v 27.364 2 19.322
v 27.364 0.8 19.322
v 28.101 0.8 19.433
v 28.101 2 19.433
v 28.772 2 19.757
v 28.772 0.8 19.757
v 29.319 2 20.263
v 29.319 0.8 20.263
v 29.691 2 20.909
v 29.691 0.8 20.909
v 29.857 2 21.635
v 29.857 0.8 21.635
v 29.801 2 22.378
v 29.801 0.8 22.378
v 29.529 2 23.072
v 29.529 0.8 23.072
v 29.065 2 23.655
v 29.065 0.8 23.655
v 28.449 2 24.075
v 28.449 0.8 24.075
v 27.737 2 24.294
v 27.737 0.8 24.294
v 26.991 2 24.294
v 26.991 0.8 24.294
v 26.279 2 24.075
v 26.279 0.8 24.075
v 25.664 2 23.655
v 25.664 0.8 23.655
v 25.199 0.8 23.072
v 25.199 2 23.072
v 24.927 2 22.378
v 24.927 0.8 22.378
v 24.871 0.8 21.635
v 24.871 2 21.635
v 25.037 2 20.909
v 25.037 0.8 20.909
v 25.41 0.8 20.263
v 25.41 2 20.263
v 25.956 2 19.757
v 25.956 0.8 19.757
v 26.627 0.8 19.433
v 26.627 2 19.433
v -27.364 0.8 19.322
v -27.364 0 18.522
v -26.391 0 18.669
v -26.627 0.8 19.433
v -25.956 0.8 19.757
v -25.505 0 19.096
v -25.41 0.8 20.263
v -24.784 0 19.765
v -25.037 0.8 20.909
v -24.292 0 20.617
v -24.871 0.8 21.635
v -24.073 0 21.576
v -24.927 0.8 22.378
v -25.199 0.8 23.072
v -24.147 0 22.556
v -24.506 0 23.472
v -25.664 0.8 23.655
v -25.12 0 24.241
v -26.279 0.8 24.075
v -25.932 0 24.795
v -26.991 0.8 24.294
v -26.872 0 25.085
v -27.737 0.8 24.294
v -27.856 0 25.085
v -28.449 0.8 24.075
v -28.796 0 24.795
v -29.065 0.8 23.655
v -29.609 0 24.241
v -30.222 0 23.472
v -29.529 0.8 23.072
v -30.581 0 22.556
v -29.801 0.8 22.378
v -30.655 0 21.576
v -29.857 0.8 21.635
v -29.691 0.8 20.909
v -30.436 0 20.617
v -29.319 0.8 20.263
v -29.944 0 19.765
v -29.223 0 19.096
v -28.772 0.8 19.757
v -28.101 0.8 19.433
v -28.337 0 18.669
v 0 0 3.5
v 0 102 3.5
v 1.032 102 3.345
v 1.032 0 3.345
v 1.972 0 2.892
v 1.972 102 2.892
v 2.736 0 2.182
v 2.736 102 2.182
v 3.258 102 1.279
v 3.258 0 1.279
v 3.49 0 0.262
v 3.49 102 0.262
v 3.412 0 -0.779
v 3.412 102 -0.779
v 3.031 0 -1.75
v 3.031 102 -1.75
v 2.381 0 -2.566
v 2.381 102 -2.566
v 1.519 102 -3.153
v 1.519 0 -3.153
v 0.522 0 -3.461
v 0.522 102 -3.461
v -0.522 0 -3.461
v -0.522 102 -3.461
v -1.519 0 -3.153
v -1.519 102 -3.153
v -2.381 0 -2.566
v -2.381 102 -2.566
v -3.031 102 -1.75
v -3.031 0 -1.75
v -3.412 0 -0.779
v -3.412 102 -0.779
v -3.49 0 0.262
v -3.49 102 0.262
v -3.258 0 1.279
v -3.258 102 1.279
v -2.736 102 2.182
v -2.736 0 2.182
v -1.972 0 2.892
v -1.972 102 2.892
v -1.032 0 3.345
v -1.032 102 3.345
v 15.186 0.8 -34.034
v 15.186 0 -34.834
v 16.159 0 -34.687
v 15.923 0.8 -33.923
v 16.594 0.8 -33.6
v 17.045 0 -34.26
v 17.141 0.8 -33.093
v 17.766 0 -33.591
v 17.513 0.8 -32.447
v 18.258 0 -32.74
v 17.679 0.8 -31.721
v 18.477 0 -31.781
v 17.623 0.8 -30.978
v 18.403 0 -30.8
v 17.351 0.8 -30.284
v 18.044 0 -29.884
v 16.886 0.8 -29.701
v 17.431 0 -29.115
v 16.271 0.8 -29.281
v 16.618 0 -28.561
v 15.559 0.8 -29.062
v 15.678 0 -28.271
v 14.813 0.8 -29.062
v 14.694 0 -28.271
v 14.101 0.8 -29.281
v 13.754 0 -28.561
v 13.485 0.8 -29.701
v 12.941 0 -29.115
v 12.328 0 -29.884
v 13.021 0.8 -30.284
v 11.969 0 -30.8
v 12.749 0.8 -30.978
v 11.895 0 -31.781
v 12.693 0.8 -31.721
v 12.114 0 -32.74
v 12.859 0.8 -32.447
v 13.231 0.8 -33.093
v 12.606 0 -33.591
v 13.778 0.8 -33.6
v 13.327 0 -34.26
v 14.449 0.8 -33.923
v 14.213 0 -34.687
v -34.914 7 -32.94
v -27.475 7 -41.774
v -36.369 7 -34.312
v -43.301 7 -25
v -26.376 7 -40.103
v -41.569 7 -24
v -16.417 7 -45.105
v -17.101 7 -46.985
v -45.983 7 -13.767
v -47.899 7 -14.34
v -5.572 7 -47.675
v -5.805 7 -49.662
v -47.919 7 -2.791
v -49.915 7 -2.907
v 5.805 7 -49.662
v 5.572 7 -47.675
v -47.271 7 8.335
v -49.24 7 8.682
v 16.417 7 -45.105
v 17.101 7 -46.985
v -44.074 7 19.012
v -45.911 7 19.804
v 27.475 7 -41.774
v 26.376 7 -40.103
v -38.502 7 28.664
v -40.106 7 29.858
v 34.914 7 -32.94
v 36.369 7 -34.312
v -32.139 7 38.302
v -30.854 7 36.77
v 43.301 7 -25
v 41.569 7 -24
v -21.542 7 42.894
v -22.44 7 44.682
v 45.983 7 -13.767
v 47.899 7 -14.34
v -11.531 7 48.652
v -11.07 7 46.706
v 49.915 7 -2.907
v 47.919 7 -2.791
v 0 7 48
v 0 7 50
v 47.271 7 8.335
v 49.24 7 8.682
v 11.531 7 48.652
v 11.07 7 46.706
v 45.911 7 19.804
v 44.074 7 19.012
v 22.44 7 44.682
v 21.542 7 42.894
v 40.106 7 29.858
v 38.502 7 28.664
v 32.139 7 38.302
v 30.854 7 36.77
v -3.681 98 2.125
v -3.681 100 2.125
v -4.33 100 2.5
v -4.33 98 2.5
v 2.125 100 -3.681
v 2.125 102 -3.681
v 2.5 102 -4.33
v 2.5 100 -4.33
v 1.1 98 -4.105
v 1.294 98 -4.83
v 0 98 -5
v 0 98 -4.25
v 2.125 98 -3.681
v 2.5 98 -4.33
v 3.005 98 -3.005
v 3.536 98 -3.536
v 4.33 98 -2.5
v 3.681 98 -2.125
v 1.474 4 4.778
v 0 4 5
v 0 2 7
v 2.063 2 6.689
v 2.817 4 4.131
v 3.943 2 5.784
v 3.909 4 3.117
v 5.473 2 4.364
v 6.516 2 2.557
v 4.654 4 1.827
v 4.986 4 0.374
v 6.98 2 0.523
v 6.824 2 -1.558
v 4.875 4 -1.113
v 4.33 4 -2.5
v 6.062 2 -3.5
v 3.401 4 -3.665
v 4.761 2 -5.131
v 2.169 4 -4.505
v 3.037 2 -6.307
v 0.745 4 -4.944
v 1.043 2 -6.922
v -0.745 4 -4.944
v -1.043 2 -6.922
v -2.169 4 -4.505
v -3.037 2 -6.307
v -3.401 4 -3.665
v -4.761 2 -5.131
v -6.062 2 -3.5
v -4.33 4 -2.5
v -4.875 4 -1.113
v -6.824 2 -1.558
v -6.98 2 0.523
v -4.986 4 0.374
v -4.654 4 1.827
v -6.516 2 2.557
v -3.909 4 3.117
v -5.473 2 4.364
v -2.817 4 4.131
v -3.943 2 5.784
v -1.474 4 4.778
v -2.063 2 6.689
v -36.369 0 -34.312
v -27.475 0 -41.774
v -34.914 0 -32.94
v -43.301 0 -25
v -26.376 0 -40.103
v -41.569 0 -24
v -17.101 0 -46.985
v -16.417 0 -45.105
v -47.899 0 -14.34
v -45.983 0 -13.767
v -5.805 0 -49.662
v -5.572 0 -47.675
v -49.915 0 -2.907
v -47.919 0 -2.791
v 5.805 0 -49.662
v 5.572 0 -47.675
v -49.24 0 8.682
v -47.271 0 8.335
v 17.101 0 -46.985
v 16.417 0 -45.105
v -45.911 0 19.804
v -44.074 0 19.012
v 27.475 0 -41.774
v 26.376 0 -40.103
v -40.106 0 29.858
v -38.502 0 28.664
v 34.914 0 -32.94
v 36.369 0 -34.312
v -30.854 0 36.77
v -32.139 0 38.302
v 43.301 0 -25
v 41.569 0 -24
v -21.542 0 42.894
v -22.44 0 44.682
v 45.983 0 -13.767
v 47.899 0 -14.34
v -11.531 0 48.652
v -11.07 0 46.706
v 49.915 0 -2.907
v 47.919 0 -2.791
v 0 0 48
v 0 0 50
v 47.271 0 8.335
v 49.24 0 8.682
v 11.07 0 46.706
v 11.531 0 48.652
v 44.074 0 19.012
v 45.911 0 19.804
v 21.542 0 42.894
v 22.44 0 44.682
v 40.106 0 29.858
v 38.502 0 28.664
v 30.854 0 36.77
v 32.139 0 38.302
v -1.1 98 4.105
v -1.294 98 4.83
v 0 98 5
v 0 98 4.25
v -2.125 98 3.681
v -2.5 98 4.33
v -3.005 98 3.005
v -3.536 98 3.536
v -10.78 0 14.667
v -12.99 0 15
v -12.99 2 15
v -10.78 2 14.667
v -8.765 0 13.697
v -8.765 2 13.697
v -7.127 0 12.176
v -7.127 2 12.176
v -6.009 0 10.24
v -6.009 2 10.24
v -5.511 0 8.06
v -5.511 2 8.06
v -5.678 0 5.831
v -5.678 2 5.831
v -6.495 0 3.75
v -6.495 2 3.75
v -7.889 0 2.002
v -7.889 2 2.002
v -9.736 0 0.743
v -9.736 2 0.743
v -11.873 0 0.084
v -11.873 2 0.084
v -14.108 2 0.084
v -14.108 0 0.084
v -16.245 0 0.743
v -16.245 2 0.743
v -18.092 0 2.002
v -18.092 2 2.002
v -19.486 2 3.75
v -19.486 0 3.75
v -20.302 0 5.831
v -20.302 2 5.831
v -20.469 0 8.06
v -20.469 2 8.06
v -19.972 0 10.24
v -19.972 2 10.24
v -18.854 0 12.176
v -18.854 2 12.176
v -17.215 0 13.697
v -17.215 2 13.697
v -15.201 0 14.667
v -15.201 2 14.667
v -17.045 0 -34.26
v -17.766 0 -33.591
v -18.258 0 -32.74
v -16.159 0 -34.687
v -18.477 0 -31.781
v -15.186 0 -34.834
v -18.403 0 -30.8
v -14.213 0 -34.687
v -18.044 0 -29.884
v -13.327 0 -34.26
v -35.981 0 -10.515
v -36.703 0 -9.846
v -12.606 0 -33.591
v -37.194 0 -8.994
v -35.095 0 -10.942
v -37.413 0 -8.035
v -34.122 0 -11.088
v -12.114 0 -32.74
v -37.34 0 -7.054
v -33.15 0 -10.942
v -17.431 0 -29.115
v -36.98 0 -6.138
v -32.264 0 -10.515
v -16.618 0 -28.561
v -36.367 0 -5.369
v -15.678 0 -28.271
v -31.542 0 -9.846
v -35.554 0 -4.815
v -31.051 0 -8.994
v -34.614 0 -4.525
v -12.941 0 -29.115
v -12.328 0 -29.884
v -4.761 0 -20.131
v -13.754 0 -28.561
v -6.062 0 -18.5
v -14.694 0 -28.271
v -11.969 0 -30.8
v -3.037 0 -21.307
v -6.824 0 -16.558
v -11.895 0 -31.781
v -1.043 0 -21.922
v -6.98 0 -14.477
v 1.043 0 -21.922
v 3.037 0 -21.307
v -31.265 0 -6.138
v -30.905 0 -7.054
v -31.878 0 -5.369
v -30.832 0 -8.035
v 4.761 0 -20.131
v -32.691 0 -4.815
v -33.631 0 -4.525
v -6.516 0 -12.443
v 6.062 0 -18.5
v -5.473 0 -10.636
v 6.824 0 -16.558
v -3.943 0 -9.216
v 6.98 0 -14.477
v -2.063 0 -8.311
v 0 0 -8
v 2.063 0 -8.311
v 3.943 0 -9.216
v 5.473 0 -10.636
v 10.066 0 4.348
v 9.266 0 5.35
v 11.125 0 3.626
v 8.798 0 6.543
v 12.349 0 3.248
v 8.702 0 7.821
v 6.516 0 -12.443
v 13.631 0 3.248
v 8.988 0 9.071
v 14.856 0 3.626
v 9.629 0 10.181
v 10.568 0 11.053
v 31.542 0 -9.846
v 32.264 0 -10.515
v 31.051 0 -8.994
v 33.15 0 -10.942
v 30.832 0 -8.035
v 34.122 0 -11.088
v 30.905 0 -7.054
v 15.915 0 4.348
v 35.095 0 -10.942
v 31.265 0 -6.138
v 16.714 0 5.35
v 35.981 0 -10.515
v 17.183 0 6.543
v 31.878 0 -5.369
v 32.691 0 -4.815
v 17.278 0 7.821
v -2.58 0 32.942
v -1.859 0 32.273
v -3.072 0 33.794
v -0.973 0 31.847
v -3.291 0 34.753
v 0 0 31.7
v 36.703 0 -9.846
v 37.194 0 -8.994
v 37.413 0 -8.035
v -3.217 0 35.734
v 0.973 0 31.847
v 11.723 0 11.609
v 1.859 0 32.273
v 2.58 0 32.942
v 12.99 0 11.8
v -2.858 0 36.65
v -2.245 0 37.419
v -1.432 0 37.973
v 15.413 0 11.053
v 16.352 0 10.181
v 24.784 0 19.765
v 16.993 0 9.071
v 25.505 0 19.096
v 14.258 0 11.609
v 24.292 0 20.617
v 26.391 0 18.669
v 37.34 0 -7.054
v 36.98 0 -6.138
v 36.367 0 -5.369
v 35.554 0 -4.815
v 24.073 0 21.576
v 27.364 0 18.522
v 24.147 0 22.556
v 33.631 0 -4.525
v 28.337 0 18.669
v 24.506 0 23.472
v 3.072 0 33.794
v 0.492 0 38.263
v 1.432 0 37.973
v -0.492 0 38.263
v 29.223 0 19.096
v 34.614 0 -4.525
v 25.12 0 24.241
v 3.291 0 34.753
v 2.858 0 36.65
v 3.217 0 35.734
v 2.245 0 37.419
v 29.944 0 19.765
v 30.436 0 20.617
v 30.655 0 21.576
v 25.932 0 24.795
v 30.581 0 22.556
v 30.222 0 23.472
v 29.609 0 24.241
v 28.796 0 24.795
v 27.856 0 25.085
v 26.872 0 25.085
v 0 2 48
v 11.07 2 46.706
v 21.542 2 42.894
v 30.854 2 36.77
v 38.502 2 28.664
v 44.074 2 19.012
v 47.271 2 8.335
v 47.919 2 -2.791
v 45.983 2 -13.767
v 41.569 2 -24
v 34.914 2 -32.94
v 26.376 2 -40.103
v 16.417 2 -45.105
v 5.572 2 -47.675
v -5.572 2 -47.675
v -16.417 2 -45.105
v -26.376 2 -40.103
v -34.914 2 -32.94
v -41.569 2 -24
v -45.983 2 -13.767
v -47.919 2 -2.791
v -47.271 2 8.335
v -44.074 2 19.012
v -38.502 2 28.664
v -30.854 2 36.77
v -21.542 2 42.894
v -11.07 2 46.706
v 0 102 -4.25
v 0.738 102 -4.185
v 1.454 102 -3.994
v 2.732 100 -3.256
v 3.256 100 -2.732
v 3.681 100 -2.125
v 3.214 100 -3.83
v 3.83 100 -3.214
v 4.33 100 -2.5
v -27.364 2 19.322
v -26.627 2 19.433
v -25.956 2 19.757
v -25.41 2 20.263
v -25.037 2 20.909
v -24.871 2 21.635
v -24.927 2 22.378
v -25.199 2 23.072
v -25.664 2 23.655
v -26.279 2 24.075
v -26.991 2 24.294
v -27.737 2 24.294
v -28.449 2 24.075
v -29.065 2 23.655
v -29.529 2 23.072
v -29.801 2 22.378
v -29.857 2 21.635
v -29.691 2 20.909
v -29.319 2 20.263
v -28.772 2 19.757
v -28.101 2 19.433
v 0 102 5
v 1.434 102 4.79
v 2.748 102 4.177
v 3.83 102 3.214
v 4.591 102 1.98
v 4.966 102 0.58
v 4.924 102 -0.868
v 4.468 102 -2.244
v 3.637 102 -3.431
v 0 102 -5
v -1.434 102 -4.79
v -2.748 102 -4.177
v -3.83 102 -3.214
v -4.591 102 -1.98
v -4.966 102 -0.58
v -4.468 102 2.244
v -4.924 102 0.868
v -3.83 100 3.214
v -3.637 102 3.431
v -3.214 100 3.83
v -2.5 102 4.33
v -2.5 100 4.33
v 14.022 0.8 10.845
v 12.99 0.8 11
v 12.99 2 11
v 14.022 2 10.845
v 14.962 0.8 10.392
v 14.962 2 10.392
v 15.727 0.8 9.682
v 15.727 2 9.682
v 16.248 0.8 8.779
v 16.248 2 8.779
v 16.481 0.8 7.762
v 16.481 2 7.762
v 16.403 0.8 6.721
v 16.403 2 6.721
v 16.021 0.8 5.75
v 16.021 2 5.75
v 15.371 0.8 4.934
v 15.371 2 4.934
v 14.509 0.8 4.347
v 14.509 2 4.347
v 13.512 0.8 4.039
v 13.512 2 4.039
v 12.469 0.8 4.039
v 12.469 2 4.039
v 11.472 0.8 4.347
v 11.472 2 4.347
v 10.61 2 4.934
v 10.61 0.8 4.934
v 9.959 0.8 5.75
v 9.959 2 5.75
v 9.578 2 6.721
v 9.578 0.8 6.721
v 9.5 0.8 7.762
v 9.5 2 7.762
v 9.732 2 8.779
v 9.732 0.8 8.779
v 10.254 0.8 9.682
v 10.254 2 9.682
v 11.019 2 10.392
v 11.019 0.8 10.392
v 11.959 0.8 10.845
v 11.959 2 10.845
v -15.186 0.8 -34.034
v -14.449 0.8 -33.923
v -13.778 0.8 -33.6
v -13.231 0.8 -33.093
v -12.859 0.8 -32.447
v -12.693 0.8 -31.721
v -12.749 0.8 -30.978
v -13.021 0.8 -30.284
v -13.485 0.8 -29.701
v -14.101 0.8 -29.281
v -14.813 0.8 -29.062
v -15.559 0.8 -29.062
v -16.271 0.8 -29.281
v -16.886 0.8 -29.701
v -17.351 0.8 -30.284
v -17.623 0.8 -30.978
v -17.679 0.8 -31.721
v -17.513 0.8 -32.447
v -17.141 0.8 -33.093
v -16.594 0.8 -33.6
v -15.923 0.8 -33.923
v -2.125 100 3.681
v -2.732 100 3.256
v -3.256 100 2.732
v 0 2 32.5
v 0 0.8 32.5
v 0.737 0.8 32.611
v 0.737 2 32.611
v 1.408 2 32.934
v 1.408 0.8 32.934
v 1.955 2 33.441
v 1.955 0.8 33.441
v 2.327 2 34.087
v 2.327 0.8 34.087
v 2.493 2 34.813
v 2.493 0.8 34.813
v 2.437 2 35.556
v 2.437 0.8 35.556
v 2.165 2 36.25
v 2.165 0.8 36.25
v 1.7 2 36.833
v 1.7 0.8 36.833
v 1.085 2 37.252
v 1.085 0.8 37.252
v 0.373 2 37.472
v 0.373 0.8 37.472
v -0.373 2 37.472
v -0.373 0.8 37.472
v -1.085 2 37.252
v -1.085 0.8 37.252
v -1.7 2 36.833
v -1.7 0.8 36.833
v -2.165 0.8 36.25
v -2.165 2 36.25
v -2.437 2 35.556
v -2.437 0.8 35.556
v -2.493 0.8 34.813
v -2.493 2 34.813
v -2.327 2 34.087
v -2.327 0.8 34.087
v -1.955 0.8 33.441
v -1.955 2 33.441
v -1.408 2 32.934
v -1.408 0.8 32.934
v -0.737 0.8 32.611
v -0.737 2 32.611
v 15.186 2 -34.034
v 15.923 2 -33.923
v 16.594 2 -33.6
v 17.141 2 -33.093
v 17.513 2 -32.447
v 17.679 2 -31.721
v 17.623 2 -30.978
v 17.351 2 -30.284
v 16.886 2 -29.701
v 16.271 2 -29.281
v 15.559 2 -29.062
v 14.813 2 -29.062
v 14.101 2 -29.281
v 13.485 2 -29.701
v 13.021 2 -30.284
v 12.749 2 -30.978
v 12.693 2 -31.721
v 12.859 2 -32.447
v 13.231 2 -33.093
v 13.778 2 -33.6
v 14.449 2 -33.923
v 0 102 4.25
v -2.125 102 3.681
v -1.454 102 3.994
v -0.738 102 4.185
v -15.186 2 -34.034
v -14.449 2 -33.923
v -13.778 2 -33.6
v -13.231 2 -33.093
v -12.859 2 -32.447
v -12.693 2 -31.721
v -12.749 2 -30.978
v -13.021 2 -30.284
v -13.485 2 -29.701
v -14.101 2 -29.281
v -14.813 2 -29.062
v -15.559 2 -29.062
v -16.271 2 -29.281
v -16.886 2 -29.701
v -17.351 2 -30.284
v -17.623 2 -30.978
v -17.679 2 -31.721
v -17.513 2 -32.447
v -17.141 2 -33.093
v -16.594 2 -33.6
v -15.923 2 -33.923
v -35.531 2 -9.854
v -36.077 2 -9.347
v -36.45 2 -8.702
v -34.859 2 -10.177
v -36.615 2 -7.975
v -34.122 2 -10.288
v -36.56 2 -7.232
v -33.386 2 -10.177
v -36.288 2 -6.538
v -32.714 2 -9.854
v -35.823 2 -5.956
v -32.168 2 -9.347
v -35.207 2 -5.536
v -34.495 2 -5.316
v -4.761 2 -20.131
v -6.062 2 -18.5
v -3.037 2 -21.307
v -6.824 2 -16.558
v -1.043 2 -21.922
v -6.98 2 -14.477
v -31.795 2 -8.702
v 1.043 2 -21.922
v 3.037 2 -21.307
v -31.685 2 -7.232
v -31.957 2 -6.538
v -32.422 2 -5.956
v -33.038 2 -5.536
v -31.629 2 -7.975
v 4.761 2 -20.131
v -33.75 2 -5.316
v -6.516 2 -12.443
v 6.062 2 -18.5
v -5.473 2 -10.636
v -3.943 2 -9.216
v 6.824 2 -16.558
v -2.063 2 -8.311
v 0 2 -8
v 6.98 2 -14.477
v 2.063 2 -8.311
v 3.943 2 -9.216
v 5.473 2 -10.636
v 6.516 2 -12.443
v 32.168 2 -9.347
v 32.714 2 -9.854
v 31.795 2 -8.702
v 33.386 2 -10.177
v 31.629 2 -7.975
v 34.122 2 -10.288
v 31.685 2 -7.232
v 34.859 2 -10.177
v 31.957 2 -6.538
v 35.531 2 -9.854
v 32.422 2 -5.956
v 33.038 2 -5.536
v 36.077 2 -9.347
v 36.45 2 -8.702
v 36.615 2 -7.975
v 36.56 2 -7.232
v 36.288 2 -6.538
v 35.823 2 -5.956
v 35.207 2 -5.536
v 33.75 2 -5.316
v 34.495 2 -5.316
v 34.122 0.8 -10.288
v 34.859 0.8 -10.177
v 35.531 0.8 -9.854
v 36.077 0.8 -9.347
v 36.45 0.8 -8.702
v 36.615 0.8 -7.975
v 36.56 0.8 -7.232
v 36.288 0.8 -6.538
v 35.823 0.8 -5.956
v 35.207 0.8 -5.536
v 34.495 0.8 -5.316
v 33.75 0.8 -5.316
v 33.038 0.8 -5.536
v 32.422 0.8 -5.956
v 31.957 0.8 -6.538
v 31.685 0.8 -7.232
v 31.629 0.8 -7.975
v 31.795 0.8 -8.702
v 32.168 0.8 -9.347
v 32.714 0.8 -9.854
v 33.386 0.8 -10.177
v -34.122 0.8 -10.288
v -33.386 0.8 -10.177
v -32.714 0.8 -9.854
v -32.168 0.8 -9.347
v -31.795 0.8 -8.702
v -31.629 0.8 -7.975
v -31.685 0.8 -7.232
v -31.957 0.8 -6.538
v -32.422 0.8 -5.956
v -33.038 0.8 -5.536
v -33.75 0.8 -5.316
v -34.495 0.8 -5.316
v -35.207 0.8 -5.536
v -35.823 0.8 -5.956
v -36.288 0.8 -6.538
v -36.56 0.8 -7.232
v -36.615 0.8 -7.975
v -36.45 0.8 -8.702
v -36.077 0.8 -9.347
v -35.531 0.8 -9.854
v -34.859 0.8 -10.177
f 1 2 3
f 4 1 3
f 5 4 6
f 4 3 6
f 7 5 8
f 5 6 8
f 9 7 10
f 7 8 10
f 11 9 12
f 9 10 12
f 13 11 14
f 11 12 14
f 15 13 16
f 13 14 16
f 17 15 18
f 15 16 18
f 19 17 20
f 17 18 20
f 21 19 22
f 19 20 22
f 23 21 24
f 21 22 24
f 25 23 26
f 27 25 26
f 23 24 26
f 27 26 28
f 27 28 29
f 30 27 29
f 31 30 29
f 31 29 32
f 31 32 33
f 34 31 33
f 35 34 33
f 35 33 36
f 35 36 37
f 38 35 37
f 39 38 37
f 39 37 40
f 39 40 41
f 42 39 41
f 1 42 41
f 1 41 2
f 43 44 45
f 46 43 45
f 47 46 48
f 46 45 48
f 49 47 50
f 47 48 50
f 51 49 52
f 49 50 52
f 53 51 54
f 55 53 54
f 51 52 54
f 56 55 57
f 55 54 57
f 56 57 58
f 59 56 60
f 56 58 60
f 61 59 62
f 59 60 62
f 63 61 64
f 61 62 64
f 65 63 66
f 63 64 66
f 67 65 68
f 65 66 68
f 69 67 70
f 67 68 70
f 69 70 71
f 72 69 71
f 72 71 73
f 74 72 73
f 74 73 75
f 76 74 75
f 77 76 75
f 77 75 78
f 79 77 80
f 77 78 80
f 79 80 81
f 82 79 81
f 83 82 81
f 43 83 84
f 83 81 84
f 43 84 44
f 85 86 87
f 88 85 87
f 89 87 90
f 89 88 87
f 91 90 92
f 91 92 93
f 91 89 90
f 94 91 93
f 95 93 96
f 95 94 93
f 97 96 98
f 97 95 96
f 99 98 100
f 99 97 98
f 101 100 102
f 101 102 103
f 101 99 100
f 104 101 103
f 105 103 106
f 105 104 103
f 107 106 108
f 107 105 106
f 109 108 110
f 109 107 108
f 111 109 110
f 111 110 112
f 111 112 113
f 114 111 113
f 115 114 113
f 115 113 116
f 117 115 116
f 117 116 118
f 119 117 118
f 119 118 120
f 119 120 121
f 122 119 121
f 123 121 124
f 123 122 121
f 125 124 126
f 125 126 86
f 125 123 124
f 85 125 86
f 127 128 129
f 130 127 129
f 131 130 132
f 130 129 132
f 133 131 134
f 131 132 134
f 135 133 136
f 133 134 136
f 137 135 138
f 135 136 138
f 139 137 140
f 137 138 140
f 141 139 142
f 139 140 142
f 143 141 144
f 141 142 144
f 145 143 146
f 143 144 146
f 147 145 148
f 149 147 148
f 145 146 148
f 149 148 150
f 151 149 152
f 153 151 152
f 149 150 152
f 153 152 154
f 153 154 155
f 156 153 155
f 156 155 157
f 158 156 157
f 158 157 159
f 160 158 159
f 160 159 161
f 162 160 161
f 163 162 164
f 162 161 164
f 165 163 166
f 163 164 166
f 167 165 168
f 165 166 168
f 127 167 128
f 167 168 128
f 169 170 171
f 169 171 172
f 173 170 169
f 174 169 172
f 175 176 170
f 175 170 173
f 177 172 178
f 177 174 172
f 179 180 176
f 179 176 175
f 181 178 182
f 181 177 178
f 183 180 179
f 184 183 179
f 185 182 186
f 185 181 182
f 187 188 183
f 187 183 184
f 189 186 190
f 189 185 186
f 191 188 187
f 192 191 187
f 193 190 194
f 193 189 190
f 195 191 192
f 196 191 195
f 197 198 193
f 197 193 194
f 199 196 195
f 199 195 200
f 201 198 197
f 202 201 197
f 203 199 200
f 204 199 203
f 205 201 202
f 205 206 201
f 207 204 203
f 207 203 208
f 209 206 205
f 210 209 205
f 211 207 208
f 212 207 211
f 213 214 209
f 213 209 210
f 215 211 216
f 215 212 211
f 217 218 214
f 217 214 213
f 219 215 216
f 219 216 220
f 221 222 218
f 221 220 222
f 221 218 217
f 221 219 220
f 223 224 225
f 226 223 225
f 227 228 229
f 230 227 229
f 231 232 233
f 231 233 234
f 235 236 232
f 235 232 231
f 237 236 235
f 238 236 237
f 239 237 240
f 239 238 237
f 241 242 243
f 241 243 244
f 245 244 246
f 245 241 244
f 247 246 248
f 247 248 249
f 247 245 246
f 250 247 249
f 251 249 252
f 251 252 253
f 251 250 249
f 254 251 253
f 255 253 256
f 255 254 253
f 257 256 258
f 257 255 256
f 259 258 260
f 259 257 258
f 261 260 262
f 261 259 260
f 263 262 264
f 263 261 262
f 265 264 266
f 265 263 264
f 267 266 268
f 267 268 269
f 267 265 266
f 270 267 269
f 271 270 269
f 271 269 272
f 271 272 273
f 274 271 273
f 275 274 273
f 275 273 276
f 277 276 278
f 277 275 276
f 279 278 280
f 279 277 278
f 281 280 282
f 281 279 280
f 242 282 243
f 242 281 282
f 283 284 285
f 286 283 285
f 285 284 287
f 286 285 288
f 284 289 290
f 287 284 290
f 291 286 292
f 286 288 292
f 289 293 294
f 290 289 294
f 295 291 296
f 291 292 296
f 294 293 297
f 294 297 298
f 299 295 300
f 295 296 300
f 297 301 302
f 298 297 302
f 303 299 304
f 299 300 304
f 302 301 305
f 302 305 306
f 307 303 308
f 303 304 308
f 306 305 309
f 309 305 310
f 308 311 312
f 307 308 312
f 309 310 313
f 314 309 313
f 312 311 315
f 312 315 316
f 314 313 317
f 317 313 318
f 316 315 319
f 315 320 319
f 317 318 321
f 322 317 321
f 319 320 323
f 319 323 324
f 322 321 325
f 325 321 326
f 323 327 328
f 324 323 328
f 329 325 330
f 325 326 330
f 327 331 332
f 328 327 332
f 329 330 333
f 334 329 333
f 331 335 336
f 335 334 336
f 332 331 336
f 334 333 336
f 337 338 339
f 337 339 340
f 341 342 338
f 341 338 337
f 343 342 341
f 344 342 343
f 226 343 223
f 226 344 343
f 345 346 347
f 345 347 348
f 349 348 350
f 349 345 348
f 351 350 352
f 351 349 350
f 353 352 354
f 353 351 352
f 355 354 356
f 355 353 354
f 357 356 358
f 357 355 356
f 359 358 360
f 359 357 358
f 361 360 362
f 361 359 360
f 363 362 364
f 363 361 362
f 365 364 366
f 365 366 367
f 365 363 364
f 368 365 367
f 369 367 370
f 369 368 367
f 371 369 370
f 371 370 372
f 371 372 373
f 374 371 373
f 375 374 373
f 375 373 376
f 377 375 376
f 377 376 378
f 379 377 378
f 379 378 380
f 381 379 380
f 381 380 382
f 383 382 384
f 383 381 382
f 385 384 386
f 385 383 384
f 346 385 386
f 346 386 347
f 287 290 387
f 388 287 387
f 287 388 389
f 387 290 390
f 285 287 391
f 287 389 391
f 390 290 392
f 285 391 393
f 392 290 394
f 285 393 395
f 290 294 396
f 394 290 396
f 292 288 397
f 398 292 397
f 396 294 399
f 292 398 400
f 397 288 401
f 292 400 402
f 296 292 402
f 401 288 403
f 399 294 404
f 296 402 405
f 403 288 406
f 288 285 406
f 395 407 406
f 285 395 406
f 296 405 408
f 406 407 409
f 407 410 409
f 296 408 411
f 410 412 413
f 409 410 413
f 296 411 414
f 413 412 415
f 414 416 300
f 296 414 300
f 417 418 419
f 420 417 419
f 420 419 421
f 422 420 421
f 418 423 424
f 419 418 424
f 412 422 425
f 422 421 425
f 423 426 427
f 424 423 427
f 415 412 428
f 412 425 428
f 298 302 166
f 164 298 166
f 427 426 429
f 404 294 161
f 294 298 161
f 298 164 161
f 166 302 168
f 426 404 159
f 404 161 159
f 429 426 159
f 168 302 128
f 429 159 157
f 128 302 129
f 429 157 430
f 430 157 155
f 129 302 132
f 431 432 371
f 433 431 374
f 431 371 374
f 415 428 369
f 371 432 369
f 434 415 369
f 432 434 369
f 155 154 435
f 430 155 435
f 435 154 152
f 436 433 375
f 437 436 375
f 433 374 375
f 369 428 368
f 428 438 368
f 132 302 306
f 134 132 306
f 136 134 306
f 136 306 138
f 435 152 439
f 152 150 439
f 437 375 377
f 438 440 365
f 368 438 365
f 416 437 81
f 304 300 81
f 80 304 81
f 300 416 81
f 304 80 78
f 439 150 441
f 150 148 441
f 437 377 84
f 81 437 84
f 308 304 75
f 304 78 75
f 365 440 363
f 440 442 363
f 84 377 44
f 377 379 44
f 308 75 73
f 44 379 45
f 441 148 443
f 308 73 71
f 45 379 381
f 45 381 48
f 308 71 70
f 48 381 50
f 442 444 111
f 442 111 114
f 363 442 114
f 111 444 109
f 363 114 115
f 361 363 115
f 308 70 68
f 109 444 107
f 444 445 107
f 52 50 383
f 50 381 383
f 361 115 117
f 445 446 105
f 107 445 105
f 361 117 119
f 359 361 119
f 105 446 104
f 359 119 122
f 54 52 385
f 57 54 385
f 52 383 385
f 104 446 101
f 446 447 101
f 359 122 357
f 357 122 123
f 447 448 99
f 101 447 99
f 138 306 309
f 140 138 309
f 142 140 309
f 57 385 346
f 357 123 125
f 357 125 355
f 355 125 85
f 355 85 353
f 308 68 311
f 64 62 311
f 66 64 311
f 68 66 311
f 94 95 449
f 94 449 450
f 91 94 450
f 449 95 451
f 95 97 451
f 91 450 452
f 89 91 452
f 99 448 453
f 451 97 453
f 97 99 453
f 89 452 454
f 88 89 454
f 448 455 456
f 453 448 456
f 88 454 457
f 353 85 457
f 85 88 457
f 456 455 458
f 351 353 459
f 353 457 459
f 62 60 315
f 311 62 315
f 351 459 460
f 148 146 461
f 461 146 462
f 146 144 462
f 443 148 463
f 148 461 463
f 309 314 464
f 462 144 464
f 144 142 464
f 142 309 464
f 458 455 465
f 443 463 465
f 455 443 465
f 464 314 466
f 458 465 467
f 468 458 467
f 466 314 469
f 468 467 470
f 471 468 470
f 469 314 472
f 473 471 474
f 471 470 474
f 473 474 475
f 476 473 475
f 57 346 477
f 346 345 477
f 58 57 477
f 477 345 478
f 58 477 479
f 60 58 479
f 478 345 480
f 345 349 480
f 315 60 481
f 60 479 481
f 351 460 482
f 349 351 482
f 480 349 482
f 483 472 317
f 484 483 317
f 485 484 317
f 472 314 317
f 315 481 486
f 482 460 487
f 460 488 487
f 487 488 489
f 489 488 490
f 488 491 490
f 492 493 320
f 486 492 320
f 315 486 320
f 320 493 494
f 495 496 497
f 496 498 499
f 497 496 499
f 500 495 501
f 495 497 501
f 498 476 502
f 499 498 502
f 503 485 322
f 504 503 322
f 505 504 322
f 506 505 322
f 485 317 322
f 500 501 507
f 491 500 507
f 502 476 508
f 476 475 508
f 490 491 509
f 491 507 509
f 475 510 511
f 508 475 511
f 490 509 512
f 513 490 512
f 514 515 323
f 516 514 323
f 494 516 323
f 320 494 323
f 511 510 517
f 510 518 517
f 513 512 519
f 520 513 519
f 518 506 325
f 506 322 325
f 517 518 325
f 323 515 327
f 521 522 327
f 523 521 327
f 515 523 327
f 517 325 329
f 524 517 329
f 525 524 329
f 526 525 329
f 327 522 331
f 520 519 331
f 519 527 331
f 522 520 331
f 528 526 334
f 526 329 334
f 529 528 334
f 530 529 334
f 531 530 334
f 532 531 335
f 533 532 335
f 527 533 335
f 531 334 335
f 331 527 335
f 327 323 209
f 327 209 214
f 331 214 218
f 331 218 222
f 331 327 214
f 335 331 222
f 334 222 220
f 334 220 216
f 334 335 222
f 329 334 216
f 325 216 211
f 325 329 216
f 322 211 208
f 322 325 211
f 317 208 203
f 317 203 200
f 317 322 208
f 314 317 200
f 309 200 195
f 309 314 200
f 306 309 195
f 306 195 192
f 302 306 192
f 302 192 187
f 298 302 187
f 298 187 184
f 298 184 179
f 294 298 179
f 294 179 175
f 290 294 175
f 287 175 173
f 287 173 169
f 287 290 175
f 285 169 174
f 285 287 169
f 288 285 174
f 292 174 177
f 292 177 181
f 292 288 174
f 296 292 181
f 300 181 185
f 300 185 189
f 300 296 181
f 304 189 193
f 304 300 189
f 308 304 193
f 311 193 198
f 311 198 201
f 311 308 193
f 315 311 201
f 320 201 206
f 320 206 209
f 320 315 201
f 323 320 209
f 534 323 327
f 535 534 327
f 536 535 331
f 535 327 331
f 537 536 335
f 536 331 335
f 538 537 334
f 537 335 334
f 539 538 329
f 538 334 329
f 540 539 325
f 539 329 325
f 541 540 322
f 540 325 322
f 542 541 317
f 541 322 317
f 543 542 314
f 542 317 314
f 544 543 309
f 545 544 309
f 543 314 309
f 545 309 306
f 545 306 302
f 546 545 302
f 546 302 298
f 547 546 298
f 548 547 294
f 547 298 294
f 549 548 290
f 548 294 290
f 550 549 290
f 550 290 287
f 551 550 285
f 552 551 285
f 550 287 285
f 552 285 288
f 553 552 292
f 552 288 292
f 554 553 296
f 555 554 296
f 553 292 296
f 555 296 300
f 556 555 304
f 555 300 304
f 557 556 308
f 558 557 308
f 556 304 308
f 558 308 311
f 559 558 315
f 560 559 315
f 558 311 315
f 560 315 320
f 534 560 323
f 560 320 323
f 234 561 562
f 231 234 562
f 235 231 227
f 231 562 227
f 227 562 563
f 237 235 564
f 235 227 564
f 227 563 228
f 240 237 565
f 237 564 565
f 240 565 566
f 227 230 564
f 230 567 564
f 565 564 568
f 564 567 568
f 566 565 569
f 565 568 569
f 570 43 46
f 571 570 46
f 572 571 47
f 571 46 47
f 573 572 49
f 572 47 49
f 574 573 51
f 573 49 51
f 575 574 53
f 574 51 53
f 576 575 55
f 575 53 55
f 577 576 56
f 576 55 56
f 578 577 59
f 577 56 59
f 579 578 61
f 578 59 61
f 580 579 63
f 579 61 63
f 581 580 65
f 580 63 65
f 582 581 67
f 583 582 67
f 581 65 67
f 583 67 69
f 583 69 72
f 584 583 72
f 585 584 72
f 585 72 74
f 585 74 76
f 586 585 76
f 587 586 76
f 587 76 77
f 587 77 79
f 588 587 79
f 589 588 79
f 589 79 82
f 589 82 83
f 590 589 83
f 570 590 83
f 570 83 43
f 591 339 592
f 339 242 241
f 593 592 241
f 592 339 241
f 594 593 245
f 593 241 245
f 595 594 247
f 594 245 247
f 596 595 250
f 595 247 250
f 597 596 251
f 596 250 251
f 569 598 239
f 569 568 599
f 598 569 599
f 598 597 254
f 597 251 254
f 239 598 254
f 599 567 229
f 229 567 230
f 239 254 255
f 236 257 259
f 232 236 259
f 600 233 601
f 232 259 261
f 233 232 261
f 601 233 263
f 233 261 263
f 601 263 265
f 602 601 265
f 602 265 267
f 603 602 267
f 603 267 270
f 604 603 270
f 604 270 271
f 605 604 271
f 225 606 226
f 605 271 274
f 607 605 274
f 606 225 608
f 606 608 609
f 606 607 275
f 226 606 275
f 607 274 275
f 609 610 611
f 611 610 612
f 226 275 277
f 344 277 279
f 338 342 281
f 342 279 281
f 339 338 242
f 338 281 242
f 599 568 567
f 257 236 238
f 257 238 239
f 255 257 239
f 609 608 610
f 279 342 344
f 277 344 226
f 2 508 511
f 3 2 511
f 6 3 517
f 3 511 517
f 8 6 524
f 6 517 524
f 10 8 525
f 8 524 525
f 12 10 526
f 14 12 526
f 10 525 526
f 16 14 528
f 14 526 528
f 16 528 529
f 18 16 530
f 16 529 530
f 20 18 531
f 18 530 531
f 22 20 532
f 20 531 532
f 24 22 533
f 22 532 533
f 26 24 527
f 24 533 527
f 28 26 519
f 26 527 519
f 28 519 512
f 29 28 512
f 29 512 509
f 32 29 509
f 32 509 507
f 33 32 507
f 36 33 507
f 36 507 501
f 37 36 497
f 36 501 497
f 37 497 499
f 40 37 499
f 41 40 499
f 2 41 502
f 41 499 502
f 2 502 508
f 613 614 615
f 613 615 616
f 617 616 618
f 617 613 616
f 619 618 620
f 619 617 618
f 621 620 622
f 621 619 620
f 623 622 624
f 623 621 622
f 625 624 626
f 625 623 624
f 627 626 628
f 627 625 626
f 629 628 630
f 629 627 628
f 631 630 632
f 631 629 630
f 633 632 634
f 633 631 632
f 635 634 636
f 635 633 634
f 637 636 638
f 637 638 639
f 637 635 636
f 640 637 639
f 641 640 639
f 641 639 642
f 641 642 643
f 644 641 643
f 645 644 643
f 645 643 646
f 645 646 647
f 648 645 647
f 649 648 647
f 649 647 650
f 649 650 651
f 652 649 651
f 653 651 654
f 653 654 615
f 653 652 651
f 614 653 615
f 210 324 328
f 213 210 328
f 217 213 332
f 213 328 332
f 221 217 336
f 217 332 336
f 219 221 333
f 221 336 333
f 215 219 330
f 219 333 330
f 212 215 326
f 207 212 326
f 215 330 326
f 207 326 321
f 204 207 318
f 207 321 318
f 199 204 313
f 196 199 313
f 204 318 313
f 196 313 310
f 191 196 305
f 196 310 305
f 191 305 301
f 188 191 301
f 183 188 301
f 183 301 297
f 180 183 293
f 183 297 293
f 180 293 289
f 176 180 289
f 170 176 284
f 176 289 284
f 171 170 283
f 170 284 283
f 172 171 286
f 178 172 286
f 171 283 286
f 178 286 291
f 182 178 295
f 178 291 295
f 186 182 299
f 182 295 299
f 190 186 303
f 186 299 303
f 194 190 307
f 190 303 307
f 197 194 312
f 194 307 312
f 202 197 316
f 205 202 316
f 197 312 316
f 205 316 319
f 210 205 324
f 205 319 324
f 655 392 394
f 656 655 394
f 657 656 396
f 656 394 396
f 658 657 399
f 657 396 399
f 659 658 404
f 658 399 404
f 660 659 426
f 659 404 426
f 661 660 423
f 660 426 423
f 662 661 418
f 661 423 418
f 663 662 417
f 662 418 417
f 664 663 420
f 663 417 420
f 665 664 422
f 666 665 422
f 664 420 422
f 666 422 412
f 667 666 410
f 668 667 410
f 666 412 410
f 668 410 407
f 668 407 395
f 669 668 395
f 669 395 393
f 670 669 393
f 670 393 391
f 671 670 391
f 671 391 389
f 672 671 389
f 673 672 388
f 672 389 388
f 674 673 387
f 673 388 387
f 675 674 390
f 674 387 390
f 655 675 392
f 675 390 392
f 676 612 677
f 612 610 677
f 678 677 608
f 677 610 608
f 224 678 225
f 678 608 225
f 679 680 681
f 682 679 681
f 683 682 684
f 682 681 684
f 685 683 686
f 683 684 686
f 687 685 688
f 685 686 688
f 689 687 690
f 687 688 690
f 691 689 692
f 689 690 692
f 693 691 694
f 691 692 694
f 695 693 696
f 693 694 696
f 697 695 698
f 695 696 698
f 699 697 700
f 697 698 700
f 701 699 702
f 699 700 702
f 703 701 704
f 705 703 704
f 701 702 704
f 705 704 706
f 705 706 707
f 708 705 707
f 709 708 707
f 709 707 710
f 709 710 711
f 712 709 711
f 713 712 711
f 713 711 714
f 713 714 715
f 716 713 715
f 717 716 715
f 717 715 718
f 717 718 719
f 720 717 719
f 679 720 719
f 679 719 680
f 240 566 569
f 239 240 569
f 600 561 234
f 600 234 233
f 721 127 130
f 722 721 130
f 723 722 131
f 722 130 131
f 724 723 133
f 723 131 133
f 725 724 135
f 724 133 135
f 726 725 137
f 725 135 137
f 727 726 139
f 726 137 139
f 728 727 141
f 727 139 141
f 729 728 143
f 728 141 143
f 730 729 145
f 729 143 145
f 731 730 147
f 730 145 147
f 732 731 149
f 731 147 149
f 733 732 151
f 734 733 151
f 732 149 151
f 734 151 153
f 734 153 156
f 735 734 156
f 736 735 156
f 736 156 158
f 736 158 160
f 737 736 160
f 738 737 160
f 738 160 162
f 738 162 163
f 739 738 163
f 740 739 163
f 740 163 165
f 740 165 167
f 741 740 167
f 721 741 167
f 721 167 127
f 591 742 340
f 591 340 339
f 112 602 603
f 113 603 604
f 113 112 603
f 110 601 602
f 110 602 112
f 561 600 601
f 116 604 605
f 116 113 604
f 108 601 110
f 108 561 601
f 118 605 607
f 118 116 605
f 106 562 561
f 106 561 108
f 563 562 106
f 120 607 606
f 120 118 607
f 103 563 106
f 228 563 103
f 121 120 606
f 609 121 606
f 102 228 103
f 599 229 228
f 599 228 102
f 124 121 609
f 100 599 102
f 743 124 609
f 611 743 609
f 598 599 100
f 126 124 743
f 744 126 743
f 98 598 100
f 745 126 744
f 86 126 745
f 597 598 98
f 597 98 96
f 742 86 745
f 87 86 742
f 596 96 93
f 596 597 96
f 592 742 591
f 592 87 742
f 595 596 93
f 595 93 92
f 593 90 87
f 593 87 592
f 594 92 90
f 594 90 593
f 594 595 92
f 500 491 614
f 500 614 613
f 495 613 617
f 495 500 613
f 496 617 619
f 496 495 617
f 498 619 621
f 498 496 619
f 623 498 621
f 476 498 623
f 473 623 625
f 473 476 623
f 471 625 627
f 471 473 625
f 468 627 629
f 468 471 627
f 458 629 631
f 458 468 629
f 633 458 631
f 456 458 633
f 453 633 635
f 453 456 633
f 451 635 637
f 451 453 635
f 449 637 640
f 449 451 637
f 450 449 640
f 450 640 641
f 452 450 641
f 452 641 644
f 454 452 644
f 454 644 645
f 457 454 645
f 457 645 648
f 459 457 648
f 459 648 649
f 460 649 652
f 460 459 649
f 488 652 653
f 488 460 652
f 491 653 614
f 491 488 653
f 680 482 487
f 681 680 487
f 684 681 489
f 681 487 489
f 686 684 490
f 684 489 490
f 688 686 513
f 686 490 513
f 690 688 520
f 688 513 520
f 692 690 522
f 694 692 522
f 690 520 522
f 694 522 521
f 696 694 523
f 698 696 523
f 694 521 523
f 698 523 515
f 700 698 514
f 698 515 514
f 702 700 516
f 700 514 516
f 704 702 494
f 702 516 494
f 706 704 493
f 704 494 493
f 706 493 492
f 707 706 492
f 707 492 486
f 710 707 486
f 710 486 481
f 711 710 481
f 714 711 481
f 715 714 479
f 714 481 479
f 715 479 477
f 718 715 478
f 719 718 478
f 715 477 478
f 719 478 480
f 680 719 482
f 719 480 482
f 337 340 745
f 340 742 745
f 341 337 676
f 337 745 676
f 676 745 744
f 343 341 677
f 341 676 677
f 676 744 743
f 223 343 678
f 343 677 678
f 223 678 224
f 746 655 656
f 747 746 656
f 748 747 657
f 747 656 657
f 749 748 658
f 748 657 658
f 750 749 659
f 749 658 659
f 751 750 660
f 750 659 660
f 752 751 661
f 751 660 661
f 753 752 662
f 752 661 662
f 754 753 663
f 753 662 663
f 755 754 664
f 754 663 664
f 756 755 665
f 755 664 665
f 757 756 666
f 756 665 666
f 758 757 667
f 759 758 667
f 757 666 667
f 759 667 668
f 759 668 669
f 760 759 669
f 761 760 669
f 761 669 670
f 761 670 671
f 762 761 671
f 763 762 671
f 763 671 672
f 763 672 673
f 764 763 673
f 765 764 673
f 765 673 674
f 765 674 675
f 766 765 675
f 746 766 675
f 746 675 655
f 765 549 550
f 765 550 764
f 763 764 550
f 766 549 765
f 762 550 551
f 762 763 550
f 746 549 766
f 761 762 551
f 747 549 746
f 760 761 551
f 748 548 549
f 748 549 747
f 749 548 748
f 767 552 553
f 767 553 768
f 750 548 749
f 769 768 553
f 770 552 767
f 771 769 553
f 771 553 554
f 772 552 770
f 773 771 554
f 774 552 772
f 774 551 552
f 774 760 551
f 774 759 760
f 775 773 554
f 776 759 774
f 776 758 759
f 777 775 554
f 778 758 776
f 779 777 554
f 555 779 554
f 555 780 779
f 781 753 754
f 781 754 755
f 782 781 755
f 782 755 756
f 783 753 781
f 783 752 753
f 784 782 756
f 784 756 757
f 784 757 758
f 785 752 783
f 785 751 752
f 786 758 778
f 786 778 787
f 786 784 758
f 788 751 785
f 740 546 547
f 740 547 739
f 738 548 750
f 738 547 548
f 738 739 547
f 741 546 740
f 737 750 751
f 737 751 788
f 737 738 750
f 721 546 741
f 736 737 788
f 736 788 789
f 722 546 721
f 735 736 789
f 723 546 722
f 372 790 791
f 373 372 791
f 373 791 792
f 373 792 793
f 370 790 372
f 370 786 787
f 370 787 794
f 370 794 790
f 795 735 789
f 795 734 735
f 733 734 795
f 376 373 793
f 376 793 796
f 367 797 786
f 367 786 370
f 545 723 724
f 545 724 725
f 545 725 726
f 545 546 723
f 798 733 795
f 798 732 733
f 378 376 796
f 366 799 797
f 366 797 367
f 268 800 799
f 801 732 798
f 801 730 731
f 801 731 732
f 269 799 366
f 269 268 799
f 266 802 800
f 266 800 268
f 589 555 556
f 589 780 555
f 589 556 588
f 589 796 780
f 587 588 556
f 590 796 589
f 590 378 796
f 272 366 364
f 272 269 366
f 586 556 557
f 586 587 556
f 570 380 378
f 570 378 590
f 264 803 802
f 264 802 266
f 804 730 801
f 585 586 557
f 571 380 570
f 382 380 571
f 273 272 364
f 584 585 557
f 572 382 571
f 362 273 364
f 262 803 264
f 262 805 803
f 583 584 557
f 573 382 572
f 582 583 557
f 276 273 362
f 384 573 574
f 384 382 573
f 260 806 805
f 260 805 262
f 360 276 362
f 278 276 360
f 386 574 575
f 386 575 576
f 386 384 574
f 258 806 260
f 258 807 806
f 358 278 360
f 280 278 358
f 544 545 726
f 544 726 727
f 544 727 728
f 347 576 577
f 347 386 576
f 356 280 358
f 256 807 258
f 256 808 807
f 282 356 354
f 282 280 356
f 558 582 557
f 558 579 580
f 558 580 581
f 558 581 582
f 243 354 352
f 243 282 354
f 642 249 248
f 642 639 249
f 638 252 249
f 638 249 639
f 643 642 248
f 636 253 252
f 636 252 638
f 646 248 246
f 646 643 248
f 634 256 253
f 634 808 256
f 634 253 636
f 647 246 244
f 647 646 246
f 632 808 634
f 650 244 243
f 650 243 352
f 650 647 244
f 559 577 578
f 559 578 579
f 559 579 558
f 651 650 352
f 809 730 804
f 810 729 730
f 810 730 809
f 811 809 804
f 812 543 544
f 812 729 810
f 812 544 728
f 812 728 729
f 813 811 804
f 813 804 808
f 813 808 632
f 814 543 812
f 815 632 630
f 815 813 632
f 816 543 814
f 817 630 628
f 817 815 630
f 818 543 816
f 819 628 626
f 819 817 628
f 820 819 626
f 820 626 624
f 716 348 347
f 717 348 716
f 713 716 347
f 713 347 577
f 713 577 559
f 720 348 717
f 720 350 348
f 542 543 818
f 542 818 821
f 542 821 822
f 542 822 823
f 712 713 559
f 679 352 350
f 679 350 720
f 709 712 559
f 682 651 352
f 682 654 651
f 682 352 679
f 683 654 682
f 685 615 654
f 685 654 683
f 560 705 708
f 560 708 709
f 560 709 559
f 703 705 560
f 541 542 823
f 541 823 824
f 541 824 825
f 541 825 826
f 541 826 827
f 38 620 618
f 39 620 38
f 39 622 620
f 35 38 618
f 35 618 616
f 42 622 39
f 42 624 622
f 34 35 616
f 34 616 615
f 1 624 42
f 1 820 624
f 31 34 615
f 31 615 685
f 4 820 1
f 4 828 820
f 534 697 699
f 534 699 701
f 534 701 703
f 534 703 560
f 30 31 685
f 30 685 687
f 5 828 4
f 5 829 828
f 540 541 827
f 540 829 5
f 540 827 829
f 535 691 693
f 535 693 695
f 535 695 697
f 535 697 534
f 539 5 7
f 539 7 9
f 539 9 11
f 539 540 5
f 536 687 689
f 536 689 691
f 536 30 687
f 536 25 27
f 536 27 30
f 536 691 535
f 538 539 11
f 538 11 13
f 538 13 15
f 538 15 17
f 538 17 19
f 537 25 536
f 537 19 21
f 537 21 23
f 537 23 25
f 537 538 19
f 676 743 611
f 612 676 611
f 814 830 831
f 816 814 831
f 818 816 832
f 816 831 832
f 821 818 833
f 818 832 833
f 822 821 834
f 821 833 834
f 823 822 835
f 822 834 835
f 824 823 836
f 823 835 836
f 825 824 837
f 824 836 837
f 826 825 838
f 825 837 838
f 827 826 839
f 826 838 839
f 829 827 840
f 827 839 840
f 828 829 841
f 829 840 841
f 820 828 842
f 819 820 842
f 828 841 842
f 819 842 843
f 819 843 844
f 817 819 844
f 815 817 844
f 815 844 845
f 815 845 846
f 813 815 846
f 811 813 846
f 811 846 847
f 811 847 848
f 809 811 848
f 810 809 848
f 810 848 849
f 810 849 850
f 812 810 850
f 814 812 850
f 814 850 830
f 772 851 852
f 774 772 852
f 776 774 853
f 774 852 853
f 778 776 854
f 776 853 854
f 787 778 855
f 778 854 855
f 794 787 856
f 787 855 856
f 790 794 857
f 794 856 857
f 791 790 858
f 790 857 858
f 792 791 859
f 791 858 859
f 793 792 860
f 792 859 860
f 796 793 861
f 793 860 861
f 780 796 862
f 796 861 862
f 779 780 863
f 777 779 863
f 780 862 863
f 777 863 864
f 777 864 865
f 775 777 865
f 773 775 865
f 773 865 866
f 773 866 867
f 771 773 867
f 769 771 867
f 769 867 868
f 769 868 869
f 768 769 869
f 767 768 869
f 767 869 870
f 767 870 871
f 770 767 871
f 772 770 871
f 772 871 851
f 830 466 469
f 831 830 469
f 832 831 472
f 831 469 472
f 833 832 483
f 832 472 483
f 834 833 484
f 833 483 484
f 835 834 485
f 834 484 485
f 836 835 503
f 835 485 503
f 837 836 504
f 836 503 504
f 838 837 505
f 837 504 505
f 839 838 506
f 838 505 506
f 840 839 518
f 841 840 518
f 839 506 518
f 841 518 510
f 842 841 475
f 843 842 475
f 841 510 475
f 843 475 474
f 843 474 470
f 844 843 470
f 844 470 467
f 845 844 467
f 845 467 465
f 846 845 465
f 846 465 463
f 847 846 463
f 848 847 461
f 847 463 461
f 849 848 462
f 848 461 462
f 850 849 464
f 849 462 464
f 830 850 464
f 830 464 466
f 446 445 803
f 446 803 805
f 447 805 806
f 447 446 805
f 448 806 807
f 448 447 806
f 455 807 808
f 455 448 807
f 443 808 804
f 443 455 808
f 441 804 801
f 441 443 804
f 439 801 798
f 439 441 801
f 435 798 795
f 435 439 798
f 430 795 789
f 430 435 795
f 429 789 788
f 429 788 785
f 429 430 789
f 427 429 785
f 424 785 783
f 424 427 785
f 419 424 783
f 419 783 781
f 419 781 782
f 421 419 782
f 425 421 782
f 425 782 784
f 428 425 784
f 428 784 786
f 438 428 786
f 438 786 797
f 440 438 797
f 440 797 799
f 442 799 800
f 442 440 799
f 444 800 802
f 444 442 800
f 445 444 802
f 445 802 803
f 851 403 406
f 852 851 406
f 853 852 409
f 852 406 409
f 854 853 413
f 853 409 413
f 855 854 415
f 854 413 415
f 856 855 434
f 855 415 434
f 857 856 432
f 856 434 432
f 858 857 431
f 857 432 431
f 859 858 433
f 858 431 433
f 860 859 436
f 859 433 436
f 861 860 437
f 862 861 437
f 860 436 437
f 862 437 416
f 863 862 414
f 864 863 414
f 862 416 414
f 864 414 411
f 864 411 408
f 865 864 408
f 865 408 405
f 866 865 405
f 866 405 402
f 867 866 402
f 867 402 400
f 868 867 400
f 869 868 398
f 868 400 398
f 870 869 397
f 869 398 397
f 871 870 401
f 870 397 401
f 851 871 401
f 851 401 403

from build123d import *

# Parameters (mm, degrees)
SKETCH1_R                = 48
SKETCH1_R_2              = 7
SKETCH1_R_3              = 7.5
SKETCH1_R_4              = 3.5
BOSS_EXTRUDE1_DEPTH      = 2
SKETCH3_R                = 5
SKETCH3_R_2              = 3.5
BOSS_EXTRUDE2_DEPTH      = 100
CUT_EXTRUDE2_REACH       = 124.523
SKETCH6_R                = 2.5
CHAMFER2_SIZE            = 0.8
SKETCH7_W                = 0.75
SKETCH7_H                = 2
CUT_REVOLVE1_ANGLE       = 30
SKETCH7_4_W              = 0.75
SKETCH7_4_H              = 2
CUT_REVOLVE2_ANGLE       = 60
CIRPATTERN5_COUNT        = 2
BOSS_EXTRUDE3_DEPTH      = 5
BOSS_EXTRUDE3_DEPTH_BACK = 2
SKETCH8_R                = 50
SKETCH8_R_2              = 48
CHAMFER3_SIZE            = 2


with BuildPart() as part:
    # Sketch1 → Boss-Extrude1 (new body)
    with BuildSketch(Plane(origin=(0, 0, 0), x_dir=(1, 0, 0), z_dir=(0, 1, 0))):
        Circle(SKETCH1_R)
        with Locations((0, 15)):
            Circle(SKETCH1_R_2, mode=Mode.SUBTRACT)
        with Locations((-12.990381057, -7.5)):
            Circle(SKETCH1_R_3, mode=Mode.SUBTRACT)
        with Locations((12.990381057, -7.5)):
            Circle(SKETCH1_R_4, mode=Mode.SUBTRACT)
        Circle(SKETCH1_R_4, mode=Mode.SUBTRACT)
    extrude(amount=BOSS_EXTRUDE1_DEPTH)

    # Sketch3 → Boss-Extrude2 (add)
    with BuildSketch(Plane(origin=(0, 2, 0), x_dir=(1, 0, 0), z_dir=(0, 1, 0))):
        Circle(SKETCH3_R)
        Circle(SKETCH3_R_2, mode=Mode.SUBTRACT)
    extrude(amount=BOSS_EXTRUDE2_DEPTH)

    # Sketch6 → Cut-Extrude2 (cut, up to next)
    with BuildSketch(Plane.XZ, mode=Mode.PRIVATE) as cut_extrude2_sk1:
        with Locations((27.364101886, 21.822143065)):
            Circle(SKETCH6_R)
    cut_extrude2_tool1 = extrude(cut_extrude2_sk1.sketch, amount=-CUT_EXTRUDE2_REACH, mode=Mode.PRIVATE) & part.part
    # Sketch6 → Cut-Extrude2 (cut, up to next)
    with BuildSketch(Plane.XZ, mode=Mode.PRIVATE) as cut_extrude2_sk2:
        with Locations((34.122476926, -7.788232688)):
            Circle(SKETCH6_R)
    cut_extrude2_tool2 = extrude(cut_extrude2_sk2.sketch, amount=-CUT_EXTRUDE2_REACH, mode=Mode.PRIVATE) & part.part
    # Sketch6 → Cut-Extrude2 (cut, up to next)
    with BuildSketch(Plane.XZ, mode=Mode.PRIVATE) as cut_extrude2_sk3:
        with Locations((0, 35)):
            Circle(SKETCH6_R)
    cut_extrude2_tool3 = extrude(cut_extrude2_sk3.sketch, amount=-CUT_EXTRUDE2_REACH, mode=Mode.PRIVATE) & part.part
    # Sketch6 → Cut-Extrude2 (cut, up to next)
    with BuildSketch(Plane.XZ, mode=Mode.PRIVATE) as cut_extrude2_sk4:
        with Locations((15.185930869, -31.533910377)):
            Circle(SKETCH6_R)
    cut_extrude2_tool4 = extrude(cut_extrude2_sk4.sketch, amount=-CUT_EXTRUDE2_REACH, mode=Mode.PRIVATE) & part.part
    # Sketch6 → Cut-Extrude2 (cut, up to next)
    with BuildSketch(Plane.XZ, mode=Mode.PRIVATE) as cut_extrude2_sk5:
        with Locations((-27.364101886, 21.822143065)):
            Circle(SKETCH6_R)
    cut_extrude2_tool5 = extrude(cut_extrude2_sk5.sketch, amount=-CUT_EXTRUDE2_REACH, mode=Mode.PRIVATE) & part.part
    # Sketch6 → Cut-Extrude2 (cut, up to next)
    with BuildSketch(Plane.XZ, mode=Mode.PRIVATE) as cut_extrude2_sk6:
        with Locations((-15.185930869, -31.533910377)):
            Circle(SKETCH6_R)
    cut_extrude2_tool6 = extrude(cut_extrude2_sk6.sketch, amount=-CUT_EXTRUDE2_REACH, mode=Mode.PRIVATE) & part.part
    # Sketch6 → Cut-Extrude2 (cut, up to next)
    with BuildSketch(Plane.XZ, mode=Mode.PRIVATE) as cut_extrude2_sk7:
        with Locations((-34.122476926, -7.788232688)):
            Circle(SKETCH6_R)
    cut_extrude2_tool7 = extrude(cut_extrude2_sk7.sketch, amount=-CUT_EXTRUDE2_REACH, mode=Mode.PRIVATE) & part.part
    add(cut_extrude2_tool1.solids().sort_by_distance((27.364102, 0, 21.822143))[0], mode=Mode.SUBTRACT)
    add(cut_extrude2_tool2.solids().sort_by_distance((34.122477, 0, -7.788233))[0], mode=Mode.SUBTRACT)
    add(cut_extrude2_tool3.solids().sort_by_distance((0, 0, 35))[0], mode=Mode.SUBTRACT)
    add(cut_extrude2_tool4.solids().sort_by_distance((15.185931, 0, -31.53391))[0], mode=Mode.SUBTRACT)
    add(cut_extrude2_tool5.solids().sort_by_distance((-27.364102, 0, 21.822143))[0], mode=Mode.SUBTRACT)
    add(cut_extrude2_tool6.solids().sort_by_distance((-15.185931, 0, -31.53391))[0], mode=Mode.SUBTRACT)
    add(cut_extrude2_tool7.solids().sort_by_distance((-34.122477, 0, -7.788233))[0], mode=Mode.SUBTRACT)

    # Chamfer2
    chamfer2_edges = [part.edges().sort_by_distance(p)[0] for p in [
        (-2.5, 0, 35),
        (-29.864101886, 0, 21.822143065),
        (-36.622476926, 0, -7.788232688),
        (-17.685930869, 0, -31.533910377),
        (24.864101886, 0, 21.822143065),
        (9.490381057, 0, 7.5),
        (31.622476926, 0, -7.788232688),
        (12.685930869, 0, -31.533910377),
    ]]
    chamfer(chamfer2_edges, length=CHAMFER2_SIZE)

    # Sketch7 → Cut-Revolve1 (revolve, cut)
    with BuildSketch(Plane(origin=(0, 0, 0), x_dir=(0, 0, -1), z_dir=(1, 0, 0))):
        with Locations((4.625, 101)):
            Rectangle(SKETCH7_W, SKETCH7_H)
    cut_revolve1 = revolve(axis=Axis((0, 102, 0), (0, -1, 0)), revolution_arc=CUT_REVOLVE1_ANGLE, mode=Mode.SUBTRACT)

    # Sketch7<4> → Cut-Revolve2 (revolve, cut)
    with BuildSketch(Plane(origin=(0, 0, 0), x_dir=(0, 0, -1), z_dir=(1, 0, 0))):
        with Locations((4.625, 99)):
            Rectangle(SKETCH7_4_W, SKETCH7_4_H)
    cut_revolve2 = revolve(axis=Axis((0, 102, 0), (0, -1, 0)), revolution_arc=CUT_REVOLVE2_ANGLE, mode=Mode.SUBTRACT)

    # CirPattern5: Cut-Revolve1, Cut-Revolve2 ×2 about axis
    cirpattern5_axis = Axis((0, 102, 0), (0, -1, 0))
    add([cut_revolve1.rotate(cirpattern5_axis, i * 360 / CIRPATTERN5_COUNT) for i in range(1, CIRPATTERN5_COUNT)], mode=Mode.SUBTRACT)
    add([cut_revolve2.rotate(cirpattern5_axis, i * 360 / CIRPATTERN5_COUNT) for i in range(1, CIRPATTERN5_COUNT)], mode=Mode.SUBTRACT)

    # Chamfer3
    chamfer3_edges = [part.edges().sort_by_distance(p)[0] for p in [
        (-5, 2, 0),
    ]]
    chamfer(chamfer3_edges, length=CHAMFER3_SIZE)


with BuildPart() as body_2:
    # Sketch8 → Boss-Extrude3 (new, two sides: drawn at the far end of the back side and taken through both)
    with BuildSketch(Plane(origin=(0, 2, 0), x_dir=(1, 0, 0), z_dir=(0, 1, 0)).offset(-BOSS_EXTRUDE3_DEPTH_BACK)):
        Circle(SKETCH8_R)
        Circle(SKETCH8_R_2, mode=Mode.SUBTRACT)
    extrude(amount=BOSS_EXTRUDE3_DEPTH + BOSS_EXTRUDE3_DEPTH_BACK)


solid = Compound([part.part, body_2.part])
